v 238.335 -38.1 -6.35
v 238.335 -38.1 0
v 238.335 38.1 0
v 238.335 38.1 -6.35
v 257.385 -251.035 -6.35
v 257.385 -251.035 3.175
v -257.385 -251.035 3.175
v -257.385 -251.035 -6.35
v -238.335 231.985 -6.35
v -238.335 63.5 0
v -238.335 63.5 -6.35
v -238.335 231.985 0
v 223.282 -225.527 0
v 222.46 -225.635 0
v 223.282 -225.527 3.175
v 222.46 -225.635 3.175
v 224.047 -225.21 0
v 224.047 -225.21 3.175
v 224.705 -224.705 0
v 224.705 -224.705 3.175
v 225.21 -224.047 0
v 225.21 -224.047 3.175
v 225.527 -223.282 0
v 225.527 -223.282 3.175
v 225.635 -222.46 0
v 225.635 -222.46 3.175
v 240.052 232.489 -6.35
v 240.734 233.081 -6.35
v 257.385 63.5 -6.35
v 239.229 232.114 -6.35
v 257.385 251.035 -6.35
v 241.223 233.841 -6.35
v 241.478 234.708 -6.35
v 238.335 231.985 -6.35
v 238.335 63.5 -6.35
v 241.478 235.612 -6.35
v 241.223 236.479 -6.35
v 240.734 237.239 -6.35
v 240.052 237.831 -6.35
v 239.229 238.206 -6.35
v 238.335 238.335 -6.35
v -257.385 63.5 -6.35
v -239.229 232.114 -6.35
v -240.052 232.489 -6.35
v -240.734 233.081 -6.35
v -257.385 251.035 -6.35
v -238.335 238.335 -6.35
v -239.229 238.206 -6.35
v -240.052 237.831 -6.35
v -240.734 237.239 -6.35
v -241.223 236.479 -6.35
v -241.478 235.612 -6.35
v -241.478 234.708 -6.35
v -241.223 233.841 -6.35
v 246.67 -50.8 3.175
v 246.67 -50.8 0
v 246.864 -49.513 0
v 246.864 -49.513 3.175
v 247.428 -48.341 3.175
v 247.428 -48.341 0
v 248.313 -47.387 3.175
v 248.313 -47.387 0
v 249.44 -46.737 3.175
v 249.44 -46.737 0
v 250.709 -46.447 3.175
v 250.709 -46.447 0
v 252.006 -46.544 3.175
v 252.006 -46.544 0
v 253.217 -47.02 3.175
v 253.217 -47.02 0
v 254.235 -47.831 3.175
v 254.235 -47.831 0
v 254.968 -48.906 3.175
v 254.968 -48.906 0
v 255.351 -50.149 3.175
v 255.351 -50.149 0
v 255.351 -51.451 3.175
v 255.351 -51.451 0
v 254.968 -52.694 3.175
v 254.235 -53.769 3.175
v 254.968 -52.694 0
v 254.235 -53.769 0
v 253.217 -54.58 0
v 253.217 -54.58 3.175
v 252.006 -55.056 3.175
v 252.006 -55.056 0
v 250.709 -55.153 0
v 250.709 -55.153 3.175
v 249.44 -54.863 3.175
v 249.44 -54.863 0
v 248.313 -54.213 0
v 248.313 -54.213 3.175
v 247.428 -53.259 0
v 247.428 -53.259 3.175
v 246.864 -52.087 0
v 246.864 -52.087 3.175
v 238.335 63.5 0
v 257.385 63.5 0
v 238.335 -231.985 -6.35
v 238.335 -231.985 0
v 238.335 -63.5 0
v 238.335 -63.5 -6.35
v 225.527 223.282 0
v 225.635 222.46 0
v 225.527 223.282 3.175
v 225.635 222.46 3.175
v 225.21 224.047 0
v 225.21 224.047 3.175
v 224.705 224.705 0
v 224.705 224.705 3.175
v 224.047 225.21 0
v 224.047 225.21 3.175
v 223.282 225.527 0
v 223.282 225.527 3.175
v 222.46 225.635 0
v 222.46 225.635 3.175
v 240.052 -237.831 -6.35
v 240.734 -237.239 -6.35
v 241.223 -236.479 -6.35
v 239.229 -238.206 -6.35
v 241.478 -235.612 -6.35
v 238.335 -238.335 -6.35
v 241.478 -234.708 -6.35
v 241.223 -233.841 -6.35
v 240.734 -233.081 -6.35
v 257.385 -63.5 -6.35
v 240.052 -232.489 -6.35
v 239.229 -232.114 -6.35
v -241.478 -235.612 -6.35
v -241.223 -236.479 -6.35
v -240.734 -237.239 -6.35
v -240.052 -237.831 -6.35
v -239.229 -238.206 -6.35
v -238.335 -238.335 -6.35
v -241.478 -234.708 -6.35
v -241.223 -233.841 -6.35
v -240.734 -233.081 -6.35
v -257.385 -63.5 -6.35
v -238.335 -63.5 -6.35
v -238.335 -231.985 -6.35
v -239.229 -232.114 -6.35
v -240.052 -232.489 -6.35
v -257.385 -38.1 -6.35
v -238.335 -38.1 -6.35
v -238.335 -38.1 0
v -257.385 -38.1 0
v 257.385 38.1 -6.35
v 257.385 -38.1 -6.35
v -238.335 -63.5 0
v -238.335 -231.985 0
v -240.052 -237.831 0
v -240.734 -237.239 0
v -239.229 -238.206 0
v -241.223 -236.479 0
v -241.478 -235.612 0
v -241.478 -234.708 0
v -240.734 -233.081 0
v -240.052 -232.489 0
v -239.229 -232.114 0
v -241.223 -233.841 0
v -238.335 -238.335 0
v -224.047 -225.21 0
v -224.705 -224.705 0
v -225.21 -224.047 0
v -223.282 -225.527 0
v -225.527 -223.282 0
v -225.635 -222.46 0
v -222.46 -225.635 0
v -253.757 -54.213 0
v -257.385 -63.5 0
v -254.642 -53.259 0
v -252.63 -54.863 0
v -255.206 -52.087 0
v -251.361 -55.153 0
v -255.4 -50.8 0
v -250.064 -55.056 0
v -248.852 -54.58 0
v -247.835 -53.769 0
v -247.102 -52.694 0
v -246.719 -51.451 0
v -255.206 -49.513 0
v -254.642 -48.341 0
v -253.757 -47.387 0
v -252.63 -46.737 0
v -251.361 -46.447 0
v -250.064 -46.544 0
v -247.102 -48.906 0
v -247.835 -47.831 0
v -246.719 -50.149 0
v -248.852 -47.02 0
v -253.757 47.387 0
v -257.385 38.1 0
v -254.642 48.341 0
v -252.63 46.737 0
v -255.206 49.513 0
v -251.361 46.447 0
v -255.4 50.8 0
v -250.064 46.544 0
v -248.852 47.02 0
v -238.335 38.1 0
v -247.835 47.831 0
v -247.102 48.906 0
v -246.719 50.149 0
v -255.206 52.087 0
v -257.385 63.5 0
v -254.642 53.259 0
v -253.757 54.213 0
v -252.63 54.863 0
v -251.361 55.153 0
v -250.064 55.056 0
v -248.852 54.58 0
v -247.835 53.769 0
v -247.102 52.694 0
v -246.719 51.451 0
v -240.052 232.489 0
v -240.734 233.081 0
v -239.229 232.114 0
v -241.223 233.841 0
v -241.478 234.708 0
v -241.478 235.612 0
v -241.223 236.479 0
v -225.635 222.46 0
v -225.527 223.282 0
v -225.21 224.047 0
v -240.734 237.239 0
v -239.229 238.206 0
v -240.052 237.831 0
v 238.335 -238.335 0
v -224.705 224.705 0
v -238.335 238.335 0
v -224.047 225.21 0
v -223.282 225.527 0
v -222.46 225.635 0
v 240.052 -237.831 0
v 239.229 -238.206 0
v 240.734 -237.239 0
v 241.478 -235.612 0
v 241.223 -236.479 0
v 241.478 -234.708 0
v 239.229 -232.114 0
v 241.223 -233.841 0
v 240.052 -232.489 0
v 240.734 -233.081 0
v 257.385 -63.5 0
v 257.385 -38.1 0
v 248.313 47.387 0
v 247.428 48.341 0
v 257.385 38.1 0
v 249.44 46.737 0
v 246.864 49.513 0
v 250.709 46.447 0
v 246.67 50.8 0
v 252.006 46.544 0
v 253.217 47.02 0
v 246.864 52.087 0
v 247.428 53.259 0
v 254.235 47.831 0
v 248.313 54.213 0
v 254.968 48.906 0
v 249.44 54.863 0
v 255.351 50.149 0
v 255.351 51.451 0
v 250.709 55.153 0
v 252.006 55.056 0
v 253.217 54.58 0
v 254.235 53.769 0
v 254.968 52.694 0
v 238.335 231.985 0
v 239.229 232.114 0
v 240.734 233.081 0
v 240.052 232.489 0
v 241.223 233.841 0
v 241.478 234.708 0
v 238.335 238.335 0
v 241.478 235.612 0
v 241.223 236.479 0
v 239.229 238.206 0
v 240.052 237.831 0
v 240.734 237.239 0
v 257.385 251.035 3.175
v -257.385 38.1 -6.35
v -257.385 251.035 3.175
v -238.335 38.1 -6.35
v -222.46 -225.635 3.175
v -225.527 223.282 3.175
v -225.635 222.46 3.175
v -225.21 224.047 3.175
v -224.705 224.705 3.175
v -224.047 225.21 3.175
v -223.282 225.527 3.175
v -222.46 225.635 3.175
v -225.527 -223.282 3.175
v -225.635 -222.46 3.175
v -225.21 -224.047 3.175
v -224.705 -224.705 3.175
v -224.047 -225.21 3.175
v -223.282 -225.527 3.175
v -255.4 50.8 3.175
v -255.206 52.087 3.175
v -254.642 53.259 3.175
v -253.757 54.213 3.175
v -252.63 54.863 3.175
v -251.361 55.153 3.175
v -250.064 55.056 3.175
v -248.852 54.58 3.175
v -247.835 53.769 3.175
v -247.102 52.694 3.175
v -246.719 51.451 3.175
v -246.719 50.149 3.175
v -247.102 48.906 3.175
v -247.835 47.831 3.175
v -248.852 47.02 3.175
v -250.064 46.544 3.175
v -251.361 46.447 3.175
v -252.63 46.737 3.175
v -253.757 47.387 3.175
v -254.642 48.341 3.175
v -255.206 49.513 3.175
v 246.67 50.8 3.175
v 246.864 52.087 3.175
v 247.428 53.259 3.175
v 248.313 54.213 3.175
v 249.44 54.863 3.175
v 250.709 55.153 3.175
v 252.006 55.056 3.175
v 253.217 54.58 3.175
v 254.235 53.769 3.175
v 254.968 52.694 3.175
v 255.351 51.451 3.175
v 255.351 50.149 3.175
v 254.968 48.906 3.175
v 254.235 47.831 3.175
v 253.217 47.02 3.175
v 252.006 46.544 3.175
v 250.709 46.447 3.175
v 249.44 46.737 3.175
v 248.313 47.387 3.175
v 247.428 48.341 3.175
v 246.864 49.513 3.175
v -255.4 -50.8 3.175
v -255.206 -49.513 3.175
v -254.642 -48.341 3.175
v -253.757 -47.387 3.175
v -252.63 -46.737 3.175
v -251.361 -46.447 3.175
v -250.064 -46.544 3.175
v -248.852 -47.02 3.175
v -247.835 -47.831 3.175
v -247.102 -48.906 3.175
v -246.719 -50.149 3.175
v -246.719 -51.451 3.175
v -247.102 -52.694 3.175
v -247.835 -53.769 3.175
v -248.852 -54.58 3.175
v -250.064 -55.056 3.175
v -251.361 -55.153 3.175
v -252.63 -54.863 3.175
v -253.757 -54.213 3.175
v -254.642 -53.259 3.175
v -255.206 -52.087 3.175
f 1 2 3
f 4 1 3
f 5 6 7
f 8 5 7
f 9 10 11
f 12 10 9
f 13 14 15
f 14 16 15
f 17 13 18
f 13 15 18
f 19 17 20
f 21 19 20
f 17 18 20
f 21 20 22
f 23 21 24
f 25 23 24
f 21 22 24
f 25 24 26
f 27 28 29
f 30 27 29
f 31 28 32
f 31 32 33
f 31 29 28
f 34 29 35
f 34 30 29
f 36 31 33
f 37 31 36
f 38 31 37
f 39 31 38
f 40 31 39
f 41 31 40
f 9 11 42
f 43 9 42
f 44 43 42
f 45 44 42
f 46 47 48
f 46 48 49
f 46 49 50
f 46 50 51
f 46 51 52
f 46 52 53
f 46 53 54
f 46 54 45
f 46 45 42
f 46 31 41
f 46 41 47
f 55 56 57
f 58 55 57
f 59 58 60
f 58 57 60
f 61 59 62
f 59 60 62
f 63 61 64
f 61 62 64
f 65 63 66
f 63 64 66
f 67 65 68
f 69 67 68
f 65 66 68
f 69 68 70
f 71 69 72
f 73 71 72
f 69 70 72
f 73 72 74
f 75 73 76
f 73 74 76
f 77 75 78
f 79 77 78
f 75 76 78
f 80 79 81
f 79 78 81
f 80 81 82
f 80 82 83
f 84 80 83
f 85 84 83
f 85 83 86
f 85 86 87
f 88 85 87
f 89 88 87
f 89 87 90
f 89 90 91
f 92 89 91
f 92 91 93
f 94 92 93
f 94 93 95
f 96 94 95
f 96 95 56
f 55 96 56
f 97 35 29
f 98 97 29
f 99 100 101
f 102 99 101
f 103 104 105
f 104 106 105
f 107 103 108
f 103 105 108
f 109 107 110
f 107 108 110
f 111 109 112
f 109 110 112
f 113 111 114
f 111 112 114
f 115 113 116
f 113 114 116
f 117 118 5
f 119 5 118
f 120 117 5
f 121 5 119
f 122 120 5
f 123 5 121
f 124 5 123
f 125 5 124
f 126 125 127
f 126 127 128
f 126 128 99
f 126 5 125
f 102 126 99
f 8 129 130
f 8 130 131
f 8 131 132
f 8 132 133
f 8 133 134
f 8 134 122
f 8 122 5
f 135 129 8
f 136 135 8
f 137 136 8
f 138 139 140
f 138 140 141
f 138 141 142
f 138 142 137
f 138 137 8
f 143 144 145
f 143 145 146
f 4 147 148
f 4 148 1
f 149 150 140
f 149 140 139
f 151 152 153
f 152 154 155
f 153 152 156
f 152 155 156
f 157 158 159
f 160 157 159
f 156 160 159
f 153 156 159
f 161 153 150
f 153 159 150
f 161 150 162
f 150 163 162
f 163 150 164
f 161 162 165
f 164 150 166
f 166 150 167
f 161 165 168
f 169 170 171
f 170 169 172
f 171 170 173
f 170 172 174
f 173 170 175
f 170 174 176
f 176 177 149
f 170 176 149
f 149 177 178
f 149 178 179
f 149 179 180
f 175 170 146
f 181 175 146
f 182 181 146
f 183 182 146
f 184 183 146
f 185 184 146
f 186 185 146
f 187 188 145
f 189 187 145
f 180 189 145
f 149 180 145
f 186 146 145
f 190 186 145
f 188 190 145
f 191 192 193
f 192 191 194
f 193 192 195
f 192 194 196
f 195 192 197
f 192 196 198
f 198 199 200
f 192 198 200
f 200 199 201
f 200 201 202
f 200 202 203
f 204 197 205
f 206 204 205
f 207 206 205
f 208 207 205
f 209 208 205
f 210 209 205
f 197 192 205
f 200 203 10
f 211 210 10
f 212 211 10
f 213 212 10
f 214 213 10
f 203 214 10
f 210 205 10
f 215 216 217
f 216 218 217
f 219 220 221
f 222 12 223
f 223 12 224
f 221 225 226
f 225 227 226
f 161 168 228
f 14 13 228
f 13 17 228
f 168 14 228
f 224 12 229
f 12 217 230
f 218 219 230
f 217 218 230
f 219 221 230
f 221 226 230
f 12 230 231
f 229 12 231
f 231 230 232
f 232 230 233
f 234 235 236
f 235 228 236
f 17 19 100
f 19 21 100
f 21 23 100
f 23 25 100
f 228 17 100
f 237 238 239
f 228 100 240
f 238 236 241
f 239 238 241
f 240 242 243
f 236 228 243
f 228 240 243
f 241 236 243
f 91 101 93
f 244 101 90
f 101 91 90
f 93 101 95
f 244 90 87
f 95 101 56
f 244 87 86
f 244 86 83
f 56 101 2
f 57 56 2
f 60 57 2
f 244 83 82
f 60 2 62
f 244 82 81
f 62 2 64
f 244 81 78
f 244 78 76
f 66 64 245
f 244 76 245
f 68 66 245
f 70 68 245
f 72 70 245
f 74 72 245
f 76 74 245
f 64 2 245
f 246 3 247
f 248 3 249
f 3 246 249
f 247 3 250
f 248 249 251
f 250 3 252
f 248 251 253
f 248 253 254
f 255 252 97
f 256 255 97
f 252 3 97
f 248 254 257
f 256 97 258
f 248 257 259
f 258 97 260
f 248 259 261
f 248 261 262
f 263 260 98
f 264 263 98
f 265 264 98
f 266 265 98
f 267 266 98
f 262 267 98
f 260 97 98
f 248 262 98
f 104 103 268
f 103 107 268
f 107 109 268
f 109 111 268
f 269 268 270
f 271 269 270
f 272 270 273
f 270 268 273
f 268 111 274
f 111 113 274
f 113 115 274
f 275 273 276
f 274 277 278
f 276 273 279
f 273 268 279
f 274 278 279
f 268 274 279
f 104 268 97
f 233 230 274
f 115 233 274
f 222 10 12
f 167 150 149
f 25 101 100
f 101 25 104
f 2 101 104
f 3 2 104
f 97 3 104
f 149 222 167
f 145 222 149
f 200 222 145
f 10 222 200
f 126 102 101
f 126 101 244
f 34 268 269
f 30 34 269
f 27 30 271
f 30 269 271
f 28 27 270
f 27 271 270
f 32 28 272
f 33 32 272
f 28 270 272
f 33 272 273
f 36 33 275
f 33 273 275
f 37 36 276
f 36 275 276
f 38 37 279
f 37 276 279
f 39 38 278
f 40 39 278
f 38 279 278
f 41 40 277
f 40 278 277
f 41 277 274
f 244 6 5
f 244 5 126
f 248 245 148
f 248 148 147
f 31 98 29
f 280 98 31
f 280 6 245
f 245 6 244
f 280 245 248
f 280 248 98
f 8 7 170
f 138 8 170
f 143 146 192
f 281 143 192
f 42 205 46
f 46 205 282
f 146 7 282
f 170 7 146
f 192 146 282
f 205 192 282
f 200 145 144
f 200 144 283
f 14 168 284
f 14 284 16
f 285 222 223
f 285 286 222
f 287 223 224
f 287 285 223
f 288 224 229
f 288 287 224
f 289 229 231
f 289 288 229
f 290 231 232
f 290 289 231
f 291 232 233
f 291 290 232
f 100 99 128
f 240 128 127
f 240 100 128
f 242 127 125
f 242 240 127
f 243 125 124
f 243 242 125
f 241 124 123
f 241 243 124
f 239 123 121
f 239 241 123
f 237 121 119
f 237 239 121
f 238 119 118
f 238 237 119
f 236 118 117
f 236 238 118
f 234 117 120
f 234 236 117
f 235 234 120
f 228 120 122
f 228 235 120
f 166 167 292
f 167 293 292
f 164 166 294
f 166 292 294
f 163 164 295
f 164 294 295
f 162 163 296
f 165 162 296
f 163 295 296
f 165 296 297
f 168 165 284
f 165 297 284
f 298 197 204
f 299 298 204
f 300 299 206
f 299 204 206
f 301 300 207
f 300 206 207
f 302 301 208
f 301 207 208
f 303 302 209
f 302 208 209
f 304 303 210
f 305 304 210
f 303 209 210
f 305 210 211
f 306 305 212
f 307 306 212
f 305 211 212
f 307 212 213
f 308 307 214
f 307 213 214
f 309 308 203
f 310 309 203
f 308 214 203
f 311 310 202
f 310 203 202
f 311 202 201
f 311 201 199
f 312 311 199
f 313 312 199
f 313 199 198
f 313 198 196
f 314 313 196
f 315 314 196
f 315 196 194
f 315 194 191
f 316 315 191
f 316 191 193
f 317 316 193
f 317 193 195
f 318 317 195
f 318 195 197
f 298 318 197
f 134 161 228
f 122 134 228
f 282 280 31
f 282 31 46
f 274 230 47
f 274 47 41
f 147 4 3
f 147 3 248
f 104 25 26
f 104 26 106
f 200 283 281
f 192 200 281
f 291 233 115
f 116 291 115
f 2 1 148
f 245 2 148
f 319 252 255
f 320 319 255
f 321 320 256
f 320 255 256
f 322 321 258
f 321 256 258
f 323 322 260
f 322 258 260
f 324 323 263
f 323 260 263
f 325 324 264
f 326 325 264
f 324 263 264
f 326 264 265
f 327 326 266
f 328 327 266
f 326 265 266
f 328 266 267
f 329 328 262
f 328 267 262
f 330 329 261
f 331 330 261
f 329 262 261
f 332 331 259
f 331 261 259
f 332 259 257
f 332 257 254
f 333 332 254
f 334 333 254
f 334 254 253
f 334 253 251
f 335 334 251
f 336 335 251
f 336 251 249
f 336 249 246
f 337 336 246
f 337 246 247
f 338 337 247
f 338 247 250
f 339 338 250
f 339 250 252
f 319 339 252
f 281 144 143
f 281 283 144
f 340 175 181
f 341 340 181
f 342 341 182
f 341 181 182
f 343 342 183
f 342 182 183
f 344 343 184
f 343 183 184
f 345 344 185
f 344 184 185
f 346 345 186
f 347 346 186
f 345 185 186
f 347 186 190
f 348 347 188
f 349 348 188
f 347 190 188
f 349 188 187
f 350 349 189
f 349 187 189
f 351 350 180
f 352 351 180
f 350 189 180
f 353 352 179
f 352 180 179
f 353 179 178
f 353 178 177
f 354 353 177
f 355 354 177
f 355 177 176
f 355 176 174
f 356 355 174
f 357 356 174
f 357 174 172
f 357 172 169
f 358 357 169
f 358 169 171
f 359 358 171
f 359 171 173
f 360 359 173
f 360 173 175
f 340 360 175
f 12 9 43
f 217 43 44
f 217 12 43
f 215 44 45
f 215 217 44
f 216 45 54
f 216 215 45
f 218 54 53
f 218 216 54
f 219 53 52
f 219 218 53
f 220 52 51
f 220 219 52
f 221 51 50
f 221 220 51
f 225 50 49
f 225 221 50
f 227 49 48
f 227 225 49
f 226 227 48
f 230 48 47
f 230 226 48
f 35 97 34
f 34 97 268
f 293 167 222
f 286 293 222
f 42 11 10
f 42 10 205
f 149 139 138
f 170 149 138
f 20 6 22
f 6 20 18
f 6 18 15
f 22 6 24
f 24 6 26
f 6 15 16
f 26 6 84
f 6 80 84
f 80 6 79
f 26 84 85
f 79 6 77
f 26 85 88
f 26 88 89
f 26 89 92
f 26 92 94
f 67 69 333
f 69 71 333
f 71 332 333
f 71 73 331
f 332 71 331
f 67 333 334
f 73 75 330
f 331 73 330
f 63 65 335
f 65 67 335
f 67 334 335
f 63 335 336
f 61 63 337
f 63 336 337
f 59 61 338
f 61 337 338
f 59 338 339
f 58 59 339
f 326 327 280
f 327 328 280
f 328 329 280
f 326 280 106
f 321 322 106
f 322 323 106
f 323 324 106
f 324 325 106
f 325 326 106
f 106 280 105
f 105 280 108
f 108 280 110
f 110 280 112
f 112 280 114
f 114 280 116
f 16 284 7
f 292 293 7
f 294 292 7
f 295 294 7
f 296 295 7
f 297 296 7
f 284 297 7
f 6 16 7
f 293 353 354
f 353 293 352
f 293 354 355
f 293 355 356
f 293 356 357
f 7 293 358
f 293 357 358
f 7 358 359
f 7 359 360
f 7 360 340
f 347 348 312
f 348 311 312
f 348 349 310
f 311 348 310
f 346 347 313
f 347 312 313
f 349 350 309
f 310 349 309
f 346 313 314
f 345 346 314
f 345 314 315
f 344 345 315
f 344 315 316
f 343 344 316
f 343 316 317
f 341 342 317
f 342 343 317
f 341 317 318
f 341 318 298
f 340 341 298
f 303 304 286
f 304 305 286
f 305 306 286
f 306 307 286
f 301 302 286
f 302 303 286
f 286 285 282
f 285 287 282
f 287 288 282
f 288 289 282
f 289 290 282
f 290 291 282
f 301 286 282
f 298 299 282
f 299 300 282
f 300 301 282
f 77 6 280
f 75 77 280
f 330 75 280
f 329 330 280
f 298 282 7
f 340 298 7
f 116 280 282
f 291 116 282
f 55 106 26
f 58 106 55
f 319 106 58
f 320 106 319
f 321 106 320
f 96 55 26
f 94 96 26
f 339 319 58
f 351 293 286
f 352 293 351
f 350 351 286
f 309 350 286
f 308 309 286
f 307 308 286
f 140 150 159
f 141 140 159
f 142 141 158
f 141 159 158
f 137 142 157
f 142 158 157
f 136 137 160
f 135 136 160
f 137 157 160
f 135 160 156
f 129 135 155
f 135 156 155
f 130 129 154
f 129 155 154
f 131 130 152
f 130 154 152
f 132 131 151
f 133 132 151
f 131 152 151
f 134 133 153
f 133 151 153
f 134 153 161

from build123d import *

# Parameters (mm, degrees)
SKETCH1_W                = 502.069989
SKETCH1_H                = 502.069989
SKETCH1_W_2              = 476.669989
SKETCH1_H_2              = 476.669989
EXTRUDE1_DEPTH           = 6.35
SKETCH2_W                = 502.069989
SKETCH2_H                = 502.069989
SKETCH2_W_2              = 451.269989
SKETCH2_H_2              = 451.269989
EXTRUDE2_DEPTH           = 3.175
SKETCH7_W                = 6.35
SKETCH7_H                = 502.069989
EXTRUDE3_DEPTH           = 9.525
F_5_16_CLEARANCE_HOLE1_D = 8.72998
SKETCH8_W                = 19.05
SKETCH8_H                = 25.4
CUT_EXTRUDE1_DEPTH       = 6.35
LPATTERN1_COUNT          = 2
LPATTERN1_PITCH          = 101.6
MIRROR2_COPY_1_SKETCH_W  = 19.05
MIRROR2_COPY_1_SKETCH_H  = 25.4
MIRROR2_COPY_1_DEPTH     = 6.35
EXTRUDE4_DEPTH           = 360.591332428
FILLET1_R                = 3.175


with BuildPart() as part:
    # Sketch1 → Extrude1 (new body)
    with BuildSketch(Plane.XY):
        Rectangle(SKETCH1_W, SKETCH1_H)
        Rectangle(SKETCH1_W_2, SKETCH1_H_2, mode=Mode.SUBTRACT)
    extrude(amount=-EXTRUDE1_DEPTH)

    # Sketch2 → Extrude2 (add)
    with BuildSketch(Plane.XY):
        Rectangle(SKETCH2_W, SKETCH2_H)
        Rectangle(SKETCH2_W_2, SKETCH2_H_2, mode=Mode.SUBTRACT)
    extrude(amount=EXTRUDE2_DEPTH)

    # Sketch7 → Extrude3 (add)
    with BuildSketch(Plane.XY.offset(3.175)):
        with Locations((-254.2099945, 0)):
            Rectangle(SKETCH7_W, SKETCH7_H)
    extrude3 = extrude(amount=-EXTRUDE3_DEPTH)

    # Mirror1: Extrude3 across plane
    add(extrude3.mirror(Plane(origin=(0, 0, 0), x_dir=(0, 0, 1), z_dir=(1, 0, 0))))

    # 5/16 Clearance Hole1 (through all)
    with Locations(Plane.XY.offset(3.175)):
        with Locations((251.0349945, -50.8), (251.0349945, 50.8), (-251.0349945, -50.8), (-251.0349945, 50.8)):
            Hole(F_5_16_CLEARANCE_HOLE1_D / 2)

    # Sketch8 → Cut-Extrude1 (cut)
    with BuildSketch(Plane(origin=(0, 0, -6.35), x_dir=(-1, 0, 0), z_dir=(0, 0, -1))):
        with Locations((247.8599945, 50.8)):
            Rectangle(SKETCH8_W, SKETCH8_H)
    cut_extrude1 = extrude(amount=-CUT_EXTRUDE1_DEPTH, mode=Mode.SUBTRACT)

    # LPattern1: Cut-Extrude1 ×2
    with Locations(*[(0, -i * LPATTERN1_PITCH, 0) for i in range(1, LPATTERN1_COUNT)]):
        add(cut_extrude1, mode=Mode.SUBTRACT)

    # Mirror2: Cut-Extrude1 across plane
    add(cut_extrude1.mirror(Plane(origin=(0, 0, 0), x_dir=(0, 0, 1), z_dir=(1, 0, 0))), mode=Mode.SUBTRACT)

    # Mirror2 copy 1 sketch → Mirror2 copy 1 (cut)
    with BuildSketch(Plane(origin=(0, -101.6, -6.35), x_dir=(1, 0, 0), z_dir=(0, 0, -1))):
        with Locations((247.8599945, -50.8)):
            Rectangle(MIRROR2_COPY_1_SKETCH_W, MIRROR2_COPY_1_SKETCH_H)
    extrude(amount=-MIRROR2_COPY_1_DEPTH, mode=Mode.SUBTRACT)

    # Sketch9 → Extrude4 (cut, through all)
    with BuildSketch(Plane(origin=(0, 0, 0), x_dir=(-1, 0, 0), z_dir=(0, 0, -1))):
        with BuildLine():
            Line((-238.3349945, 238.3349945), (-235.1599945, 238.3349945))
            Line((-235.1599945, 238.3349945), (-235.1599945, 235.1599945))
            ThreePointArc((-235.1599945, 235.1599945), (-240.58005853, 232.91493047), (-238.3349945, 238.3349945))
        make_face()
        with BuildLine():
            Line((235.1599945, 238.3349945), (235.1599945, 235.1599945))
            ThreePointArc((235.1599945, 235.1599945), (240.58005853, 232.91493047), (238.3349945, 238.3349945))
            Line((238.3349945, 238.3349945), (235.1599945, 238.3349945))
        make_face()
        with BuildLine():
            Line((238.3349945, -238.3349945), (235.1599945, -238.3349945))
            Line((235.1599945, -238.3349945), (235.1599945, -235.1599945))
            ThreePointArc((235.1599945, -235.1599945), (240.58005853, -232.91493047), (238.3349945, -238.3349945))
        make_face()
        with BuildLine():
            Line((-235.1599945, -238.3349945), (-235.1599945, -235.1599945))
            ThreePointArc((-235.1599945, -235.1599945), (-240.58005853, -232.91493047), (-238.3349945, -238.3349945))
            Line((-238.3349945, -238.3349945), (-235.1599945, -238.3349945))
        make_face()
    extrude(amount=EXTRUDE4_DEPTH, mode=Mode.SUBTRACT)

    # Fillet1
    fillet1_edges = [part.edges().sort_by_distance(p)[0] for p in [
        (-225.6349945, 225.6349945, 1.5875),
        (-225.6349945, -225.6349945, 1.5875),
        (225.6349945, -225.6349945, 1.5875),
        (225.6349945, 225.6349945, 1.5875),
    ]]
    fillet(fillet1_edges, radius=FILLET1_R)


solid = part.part
